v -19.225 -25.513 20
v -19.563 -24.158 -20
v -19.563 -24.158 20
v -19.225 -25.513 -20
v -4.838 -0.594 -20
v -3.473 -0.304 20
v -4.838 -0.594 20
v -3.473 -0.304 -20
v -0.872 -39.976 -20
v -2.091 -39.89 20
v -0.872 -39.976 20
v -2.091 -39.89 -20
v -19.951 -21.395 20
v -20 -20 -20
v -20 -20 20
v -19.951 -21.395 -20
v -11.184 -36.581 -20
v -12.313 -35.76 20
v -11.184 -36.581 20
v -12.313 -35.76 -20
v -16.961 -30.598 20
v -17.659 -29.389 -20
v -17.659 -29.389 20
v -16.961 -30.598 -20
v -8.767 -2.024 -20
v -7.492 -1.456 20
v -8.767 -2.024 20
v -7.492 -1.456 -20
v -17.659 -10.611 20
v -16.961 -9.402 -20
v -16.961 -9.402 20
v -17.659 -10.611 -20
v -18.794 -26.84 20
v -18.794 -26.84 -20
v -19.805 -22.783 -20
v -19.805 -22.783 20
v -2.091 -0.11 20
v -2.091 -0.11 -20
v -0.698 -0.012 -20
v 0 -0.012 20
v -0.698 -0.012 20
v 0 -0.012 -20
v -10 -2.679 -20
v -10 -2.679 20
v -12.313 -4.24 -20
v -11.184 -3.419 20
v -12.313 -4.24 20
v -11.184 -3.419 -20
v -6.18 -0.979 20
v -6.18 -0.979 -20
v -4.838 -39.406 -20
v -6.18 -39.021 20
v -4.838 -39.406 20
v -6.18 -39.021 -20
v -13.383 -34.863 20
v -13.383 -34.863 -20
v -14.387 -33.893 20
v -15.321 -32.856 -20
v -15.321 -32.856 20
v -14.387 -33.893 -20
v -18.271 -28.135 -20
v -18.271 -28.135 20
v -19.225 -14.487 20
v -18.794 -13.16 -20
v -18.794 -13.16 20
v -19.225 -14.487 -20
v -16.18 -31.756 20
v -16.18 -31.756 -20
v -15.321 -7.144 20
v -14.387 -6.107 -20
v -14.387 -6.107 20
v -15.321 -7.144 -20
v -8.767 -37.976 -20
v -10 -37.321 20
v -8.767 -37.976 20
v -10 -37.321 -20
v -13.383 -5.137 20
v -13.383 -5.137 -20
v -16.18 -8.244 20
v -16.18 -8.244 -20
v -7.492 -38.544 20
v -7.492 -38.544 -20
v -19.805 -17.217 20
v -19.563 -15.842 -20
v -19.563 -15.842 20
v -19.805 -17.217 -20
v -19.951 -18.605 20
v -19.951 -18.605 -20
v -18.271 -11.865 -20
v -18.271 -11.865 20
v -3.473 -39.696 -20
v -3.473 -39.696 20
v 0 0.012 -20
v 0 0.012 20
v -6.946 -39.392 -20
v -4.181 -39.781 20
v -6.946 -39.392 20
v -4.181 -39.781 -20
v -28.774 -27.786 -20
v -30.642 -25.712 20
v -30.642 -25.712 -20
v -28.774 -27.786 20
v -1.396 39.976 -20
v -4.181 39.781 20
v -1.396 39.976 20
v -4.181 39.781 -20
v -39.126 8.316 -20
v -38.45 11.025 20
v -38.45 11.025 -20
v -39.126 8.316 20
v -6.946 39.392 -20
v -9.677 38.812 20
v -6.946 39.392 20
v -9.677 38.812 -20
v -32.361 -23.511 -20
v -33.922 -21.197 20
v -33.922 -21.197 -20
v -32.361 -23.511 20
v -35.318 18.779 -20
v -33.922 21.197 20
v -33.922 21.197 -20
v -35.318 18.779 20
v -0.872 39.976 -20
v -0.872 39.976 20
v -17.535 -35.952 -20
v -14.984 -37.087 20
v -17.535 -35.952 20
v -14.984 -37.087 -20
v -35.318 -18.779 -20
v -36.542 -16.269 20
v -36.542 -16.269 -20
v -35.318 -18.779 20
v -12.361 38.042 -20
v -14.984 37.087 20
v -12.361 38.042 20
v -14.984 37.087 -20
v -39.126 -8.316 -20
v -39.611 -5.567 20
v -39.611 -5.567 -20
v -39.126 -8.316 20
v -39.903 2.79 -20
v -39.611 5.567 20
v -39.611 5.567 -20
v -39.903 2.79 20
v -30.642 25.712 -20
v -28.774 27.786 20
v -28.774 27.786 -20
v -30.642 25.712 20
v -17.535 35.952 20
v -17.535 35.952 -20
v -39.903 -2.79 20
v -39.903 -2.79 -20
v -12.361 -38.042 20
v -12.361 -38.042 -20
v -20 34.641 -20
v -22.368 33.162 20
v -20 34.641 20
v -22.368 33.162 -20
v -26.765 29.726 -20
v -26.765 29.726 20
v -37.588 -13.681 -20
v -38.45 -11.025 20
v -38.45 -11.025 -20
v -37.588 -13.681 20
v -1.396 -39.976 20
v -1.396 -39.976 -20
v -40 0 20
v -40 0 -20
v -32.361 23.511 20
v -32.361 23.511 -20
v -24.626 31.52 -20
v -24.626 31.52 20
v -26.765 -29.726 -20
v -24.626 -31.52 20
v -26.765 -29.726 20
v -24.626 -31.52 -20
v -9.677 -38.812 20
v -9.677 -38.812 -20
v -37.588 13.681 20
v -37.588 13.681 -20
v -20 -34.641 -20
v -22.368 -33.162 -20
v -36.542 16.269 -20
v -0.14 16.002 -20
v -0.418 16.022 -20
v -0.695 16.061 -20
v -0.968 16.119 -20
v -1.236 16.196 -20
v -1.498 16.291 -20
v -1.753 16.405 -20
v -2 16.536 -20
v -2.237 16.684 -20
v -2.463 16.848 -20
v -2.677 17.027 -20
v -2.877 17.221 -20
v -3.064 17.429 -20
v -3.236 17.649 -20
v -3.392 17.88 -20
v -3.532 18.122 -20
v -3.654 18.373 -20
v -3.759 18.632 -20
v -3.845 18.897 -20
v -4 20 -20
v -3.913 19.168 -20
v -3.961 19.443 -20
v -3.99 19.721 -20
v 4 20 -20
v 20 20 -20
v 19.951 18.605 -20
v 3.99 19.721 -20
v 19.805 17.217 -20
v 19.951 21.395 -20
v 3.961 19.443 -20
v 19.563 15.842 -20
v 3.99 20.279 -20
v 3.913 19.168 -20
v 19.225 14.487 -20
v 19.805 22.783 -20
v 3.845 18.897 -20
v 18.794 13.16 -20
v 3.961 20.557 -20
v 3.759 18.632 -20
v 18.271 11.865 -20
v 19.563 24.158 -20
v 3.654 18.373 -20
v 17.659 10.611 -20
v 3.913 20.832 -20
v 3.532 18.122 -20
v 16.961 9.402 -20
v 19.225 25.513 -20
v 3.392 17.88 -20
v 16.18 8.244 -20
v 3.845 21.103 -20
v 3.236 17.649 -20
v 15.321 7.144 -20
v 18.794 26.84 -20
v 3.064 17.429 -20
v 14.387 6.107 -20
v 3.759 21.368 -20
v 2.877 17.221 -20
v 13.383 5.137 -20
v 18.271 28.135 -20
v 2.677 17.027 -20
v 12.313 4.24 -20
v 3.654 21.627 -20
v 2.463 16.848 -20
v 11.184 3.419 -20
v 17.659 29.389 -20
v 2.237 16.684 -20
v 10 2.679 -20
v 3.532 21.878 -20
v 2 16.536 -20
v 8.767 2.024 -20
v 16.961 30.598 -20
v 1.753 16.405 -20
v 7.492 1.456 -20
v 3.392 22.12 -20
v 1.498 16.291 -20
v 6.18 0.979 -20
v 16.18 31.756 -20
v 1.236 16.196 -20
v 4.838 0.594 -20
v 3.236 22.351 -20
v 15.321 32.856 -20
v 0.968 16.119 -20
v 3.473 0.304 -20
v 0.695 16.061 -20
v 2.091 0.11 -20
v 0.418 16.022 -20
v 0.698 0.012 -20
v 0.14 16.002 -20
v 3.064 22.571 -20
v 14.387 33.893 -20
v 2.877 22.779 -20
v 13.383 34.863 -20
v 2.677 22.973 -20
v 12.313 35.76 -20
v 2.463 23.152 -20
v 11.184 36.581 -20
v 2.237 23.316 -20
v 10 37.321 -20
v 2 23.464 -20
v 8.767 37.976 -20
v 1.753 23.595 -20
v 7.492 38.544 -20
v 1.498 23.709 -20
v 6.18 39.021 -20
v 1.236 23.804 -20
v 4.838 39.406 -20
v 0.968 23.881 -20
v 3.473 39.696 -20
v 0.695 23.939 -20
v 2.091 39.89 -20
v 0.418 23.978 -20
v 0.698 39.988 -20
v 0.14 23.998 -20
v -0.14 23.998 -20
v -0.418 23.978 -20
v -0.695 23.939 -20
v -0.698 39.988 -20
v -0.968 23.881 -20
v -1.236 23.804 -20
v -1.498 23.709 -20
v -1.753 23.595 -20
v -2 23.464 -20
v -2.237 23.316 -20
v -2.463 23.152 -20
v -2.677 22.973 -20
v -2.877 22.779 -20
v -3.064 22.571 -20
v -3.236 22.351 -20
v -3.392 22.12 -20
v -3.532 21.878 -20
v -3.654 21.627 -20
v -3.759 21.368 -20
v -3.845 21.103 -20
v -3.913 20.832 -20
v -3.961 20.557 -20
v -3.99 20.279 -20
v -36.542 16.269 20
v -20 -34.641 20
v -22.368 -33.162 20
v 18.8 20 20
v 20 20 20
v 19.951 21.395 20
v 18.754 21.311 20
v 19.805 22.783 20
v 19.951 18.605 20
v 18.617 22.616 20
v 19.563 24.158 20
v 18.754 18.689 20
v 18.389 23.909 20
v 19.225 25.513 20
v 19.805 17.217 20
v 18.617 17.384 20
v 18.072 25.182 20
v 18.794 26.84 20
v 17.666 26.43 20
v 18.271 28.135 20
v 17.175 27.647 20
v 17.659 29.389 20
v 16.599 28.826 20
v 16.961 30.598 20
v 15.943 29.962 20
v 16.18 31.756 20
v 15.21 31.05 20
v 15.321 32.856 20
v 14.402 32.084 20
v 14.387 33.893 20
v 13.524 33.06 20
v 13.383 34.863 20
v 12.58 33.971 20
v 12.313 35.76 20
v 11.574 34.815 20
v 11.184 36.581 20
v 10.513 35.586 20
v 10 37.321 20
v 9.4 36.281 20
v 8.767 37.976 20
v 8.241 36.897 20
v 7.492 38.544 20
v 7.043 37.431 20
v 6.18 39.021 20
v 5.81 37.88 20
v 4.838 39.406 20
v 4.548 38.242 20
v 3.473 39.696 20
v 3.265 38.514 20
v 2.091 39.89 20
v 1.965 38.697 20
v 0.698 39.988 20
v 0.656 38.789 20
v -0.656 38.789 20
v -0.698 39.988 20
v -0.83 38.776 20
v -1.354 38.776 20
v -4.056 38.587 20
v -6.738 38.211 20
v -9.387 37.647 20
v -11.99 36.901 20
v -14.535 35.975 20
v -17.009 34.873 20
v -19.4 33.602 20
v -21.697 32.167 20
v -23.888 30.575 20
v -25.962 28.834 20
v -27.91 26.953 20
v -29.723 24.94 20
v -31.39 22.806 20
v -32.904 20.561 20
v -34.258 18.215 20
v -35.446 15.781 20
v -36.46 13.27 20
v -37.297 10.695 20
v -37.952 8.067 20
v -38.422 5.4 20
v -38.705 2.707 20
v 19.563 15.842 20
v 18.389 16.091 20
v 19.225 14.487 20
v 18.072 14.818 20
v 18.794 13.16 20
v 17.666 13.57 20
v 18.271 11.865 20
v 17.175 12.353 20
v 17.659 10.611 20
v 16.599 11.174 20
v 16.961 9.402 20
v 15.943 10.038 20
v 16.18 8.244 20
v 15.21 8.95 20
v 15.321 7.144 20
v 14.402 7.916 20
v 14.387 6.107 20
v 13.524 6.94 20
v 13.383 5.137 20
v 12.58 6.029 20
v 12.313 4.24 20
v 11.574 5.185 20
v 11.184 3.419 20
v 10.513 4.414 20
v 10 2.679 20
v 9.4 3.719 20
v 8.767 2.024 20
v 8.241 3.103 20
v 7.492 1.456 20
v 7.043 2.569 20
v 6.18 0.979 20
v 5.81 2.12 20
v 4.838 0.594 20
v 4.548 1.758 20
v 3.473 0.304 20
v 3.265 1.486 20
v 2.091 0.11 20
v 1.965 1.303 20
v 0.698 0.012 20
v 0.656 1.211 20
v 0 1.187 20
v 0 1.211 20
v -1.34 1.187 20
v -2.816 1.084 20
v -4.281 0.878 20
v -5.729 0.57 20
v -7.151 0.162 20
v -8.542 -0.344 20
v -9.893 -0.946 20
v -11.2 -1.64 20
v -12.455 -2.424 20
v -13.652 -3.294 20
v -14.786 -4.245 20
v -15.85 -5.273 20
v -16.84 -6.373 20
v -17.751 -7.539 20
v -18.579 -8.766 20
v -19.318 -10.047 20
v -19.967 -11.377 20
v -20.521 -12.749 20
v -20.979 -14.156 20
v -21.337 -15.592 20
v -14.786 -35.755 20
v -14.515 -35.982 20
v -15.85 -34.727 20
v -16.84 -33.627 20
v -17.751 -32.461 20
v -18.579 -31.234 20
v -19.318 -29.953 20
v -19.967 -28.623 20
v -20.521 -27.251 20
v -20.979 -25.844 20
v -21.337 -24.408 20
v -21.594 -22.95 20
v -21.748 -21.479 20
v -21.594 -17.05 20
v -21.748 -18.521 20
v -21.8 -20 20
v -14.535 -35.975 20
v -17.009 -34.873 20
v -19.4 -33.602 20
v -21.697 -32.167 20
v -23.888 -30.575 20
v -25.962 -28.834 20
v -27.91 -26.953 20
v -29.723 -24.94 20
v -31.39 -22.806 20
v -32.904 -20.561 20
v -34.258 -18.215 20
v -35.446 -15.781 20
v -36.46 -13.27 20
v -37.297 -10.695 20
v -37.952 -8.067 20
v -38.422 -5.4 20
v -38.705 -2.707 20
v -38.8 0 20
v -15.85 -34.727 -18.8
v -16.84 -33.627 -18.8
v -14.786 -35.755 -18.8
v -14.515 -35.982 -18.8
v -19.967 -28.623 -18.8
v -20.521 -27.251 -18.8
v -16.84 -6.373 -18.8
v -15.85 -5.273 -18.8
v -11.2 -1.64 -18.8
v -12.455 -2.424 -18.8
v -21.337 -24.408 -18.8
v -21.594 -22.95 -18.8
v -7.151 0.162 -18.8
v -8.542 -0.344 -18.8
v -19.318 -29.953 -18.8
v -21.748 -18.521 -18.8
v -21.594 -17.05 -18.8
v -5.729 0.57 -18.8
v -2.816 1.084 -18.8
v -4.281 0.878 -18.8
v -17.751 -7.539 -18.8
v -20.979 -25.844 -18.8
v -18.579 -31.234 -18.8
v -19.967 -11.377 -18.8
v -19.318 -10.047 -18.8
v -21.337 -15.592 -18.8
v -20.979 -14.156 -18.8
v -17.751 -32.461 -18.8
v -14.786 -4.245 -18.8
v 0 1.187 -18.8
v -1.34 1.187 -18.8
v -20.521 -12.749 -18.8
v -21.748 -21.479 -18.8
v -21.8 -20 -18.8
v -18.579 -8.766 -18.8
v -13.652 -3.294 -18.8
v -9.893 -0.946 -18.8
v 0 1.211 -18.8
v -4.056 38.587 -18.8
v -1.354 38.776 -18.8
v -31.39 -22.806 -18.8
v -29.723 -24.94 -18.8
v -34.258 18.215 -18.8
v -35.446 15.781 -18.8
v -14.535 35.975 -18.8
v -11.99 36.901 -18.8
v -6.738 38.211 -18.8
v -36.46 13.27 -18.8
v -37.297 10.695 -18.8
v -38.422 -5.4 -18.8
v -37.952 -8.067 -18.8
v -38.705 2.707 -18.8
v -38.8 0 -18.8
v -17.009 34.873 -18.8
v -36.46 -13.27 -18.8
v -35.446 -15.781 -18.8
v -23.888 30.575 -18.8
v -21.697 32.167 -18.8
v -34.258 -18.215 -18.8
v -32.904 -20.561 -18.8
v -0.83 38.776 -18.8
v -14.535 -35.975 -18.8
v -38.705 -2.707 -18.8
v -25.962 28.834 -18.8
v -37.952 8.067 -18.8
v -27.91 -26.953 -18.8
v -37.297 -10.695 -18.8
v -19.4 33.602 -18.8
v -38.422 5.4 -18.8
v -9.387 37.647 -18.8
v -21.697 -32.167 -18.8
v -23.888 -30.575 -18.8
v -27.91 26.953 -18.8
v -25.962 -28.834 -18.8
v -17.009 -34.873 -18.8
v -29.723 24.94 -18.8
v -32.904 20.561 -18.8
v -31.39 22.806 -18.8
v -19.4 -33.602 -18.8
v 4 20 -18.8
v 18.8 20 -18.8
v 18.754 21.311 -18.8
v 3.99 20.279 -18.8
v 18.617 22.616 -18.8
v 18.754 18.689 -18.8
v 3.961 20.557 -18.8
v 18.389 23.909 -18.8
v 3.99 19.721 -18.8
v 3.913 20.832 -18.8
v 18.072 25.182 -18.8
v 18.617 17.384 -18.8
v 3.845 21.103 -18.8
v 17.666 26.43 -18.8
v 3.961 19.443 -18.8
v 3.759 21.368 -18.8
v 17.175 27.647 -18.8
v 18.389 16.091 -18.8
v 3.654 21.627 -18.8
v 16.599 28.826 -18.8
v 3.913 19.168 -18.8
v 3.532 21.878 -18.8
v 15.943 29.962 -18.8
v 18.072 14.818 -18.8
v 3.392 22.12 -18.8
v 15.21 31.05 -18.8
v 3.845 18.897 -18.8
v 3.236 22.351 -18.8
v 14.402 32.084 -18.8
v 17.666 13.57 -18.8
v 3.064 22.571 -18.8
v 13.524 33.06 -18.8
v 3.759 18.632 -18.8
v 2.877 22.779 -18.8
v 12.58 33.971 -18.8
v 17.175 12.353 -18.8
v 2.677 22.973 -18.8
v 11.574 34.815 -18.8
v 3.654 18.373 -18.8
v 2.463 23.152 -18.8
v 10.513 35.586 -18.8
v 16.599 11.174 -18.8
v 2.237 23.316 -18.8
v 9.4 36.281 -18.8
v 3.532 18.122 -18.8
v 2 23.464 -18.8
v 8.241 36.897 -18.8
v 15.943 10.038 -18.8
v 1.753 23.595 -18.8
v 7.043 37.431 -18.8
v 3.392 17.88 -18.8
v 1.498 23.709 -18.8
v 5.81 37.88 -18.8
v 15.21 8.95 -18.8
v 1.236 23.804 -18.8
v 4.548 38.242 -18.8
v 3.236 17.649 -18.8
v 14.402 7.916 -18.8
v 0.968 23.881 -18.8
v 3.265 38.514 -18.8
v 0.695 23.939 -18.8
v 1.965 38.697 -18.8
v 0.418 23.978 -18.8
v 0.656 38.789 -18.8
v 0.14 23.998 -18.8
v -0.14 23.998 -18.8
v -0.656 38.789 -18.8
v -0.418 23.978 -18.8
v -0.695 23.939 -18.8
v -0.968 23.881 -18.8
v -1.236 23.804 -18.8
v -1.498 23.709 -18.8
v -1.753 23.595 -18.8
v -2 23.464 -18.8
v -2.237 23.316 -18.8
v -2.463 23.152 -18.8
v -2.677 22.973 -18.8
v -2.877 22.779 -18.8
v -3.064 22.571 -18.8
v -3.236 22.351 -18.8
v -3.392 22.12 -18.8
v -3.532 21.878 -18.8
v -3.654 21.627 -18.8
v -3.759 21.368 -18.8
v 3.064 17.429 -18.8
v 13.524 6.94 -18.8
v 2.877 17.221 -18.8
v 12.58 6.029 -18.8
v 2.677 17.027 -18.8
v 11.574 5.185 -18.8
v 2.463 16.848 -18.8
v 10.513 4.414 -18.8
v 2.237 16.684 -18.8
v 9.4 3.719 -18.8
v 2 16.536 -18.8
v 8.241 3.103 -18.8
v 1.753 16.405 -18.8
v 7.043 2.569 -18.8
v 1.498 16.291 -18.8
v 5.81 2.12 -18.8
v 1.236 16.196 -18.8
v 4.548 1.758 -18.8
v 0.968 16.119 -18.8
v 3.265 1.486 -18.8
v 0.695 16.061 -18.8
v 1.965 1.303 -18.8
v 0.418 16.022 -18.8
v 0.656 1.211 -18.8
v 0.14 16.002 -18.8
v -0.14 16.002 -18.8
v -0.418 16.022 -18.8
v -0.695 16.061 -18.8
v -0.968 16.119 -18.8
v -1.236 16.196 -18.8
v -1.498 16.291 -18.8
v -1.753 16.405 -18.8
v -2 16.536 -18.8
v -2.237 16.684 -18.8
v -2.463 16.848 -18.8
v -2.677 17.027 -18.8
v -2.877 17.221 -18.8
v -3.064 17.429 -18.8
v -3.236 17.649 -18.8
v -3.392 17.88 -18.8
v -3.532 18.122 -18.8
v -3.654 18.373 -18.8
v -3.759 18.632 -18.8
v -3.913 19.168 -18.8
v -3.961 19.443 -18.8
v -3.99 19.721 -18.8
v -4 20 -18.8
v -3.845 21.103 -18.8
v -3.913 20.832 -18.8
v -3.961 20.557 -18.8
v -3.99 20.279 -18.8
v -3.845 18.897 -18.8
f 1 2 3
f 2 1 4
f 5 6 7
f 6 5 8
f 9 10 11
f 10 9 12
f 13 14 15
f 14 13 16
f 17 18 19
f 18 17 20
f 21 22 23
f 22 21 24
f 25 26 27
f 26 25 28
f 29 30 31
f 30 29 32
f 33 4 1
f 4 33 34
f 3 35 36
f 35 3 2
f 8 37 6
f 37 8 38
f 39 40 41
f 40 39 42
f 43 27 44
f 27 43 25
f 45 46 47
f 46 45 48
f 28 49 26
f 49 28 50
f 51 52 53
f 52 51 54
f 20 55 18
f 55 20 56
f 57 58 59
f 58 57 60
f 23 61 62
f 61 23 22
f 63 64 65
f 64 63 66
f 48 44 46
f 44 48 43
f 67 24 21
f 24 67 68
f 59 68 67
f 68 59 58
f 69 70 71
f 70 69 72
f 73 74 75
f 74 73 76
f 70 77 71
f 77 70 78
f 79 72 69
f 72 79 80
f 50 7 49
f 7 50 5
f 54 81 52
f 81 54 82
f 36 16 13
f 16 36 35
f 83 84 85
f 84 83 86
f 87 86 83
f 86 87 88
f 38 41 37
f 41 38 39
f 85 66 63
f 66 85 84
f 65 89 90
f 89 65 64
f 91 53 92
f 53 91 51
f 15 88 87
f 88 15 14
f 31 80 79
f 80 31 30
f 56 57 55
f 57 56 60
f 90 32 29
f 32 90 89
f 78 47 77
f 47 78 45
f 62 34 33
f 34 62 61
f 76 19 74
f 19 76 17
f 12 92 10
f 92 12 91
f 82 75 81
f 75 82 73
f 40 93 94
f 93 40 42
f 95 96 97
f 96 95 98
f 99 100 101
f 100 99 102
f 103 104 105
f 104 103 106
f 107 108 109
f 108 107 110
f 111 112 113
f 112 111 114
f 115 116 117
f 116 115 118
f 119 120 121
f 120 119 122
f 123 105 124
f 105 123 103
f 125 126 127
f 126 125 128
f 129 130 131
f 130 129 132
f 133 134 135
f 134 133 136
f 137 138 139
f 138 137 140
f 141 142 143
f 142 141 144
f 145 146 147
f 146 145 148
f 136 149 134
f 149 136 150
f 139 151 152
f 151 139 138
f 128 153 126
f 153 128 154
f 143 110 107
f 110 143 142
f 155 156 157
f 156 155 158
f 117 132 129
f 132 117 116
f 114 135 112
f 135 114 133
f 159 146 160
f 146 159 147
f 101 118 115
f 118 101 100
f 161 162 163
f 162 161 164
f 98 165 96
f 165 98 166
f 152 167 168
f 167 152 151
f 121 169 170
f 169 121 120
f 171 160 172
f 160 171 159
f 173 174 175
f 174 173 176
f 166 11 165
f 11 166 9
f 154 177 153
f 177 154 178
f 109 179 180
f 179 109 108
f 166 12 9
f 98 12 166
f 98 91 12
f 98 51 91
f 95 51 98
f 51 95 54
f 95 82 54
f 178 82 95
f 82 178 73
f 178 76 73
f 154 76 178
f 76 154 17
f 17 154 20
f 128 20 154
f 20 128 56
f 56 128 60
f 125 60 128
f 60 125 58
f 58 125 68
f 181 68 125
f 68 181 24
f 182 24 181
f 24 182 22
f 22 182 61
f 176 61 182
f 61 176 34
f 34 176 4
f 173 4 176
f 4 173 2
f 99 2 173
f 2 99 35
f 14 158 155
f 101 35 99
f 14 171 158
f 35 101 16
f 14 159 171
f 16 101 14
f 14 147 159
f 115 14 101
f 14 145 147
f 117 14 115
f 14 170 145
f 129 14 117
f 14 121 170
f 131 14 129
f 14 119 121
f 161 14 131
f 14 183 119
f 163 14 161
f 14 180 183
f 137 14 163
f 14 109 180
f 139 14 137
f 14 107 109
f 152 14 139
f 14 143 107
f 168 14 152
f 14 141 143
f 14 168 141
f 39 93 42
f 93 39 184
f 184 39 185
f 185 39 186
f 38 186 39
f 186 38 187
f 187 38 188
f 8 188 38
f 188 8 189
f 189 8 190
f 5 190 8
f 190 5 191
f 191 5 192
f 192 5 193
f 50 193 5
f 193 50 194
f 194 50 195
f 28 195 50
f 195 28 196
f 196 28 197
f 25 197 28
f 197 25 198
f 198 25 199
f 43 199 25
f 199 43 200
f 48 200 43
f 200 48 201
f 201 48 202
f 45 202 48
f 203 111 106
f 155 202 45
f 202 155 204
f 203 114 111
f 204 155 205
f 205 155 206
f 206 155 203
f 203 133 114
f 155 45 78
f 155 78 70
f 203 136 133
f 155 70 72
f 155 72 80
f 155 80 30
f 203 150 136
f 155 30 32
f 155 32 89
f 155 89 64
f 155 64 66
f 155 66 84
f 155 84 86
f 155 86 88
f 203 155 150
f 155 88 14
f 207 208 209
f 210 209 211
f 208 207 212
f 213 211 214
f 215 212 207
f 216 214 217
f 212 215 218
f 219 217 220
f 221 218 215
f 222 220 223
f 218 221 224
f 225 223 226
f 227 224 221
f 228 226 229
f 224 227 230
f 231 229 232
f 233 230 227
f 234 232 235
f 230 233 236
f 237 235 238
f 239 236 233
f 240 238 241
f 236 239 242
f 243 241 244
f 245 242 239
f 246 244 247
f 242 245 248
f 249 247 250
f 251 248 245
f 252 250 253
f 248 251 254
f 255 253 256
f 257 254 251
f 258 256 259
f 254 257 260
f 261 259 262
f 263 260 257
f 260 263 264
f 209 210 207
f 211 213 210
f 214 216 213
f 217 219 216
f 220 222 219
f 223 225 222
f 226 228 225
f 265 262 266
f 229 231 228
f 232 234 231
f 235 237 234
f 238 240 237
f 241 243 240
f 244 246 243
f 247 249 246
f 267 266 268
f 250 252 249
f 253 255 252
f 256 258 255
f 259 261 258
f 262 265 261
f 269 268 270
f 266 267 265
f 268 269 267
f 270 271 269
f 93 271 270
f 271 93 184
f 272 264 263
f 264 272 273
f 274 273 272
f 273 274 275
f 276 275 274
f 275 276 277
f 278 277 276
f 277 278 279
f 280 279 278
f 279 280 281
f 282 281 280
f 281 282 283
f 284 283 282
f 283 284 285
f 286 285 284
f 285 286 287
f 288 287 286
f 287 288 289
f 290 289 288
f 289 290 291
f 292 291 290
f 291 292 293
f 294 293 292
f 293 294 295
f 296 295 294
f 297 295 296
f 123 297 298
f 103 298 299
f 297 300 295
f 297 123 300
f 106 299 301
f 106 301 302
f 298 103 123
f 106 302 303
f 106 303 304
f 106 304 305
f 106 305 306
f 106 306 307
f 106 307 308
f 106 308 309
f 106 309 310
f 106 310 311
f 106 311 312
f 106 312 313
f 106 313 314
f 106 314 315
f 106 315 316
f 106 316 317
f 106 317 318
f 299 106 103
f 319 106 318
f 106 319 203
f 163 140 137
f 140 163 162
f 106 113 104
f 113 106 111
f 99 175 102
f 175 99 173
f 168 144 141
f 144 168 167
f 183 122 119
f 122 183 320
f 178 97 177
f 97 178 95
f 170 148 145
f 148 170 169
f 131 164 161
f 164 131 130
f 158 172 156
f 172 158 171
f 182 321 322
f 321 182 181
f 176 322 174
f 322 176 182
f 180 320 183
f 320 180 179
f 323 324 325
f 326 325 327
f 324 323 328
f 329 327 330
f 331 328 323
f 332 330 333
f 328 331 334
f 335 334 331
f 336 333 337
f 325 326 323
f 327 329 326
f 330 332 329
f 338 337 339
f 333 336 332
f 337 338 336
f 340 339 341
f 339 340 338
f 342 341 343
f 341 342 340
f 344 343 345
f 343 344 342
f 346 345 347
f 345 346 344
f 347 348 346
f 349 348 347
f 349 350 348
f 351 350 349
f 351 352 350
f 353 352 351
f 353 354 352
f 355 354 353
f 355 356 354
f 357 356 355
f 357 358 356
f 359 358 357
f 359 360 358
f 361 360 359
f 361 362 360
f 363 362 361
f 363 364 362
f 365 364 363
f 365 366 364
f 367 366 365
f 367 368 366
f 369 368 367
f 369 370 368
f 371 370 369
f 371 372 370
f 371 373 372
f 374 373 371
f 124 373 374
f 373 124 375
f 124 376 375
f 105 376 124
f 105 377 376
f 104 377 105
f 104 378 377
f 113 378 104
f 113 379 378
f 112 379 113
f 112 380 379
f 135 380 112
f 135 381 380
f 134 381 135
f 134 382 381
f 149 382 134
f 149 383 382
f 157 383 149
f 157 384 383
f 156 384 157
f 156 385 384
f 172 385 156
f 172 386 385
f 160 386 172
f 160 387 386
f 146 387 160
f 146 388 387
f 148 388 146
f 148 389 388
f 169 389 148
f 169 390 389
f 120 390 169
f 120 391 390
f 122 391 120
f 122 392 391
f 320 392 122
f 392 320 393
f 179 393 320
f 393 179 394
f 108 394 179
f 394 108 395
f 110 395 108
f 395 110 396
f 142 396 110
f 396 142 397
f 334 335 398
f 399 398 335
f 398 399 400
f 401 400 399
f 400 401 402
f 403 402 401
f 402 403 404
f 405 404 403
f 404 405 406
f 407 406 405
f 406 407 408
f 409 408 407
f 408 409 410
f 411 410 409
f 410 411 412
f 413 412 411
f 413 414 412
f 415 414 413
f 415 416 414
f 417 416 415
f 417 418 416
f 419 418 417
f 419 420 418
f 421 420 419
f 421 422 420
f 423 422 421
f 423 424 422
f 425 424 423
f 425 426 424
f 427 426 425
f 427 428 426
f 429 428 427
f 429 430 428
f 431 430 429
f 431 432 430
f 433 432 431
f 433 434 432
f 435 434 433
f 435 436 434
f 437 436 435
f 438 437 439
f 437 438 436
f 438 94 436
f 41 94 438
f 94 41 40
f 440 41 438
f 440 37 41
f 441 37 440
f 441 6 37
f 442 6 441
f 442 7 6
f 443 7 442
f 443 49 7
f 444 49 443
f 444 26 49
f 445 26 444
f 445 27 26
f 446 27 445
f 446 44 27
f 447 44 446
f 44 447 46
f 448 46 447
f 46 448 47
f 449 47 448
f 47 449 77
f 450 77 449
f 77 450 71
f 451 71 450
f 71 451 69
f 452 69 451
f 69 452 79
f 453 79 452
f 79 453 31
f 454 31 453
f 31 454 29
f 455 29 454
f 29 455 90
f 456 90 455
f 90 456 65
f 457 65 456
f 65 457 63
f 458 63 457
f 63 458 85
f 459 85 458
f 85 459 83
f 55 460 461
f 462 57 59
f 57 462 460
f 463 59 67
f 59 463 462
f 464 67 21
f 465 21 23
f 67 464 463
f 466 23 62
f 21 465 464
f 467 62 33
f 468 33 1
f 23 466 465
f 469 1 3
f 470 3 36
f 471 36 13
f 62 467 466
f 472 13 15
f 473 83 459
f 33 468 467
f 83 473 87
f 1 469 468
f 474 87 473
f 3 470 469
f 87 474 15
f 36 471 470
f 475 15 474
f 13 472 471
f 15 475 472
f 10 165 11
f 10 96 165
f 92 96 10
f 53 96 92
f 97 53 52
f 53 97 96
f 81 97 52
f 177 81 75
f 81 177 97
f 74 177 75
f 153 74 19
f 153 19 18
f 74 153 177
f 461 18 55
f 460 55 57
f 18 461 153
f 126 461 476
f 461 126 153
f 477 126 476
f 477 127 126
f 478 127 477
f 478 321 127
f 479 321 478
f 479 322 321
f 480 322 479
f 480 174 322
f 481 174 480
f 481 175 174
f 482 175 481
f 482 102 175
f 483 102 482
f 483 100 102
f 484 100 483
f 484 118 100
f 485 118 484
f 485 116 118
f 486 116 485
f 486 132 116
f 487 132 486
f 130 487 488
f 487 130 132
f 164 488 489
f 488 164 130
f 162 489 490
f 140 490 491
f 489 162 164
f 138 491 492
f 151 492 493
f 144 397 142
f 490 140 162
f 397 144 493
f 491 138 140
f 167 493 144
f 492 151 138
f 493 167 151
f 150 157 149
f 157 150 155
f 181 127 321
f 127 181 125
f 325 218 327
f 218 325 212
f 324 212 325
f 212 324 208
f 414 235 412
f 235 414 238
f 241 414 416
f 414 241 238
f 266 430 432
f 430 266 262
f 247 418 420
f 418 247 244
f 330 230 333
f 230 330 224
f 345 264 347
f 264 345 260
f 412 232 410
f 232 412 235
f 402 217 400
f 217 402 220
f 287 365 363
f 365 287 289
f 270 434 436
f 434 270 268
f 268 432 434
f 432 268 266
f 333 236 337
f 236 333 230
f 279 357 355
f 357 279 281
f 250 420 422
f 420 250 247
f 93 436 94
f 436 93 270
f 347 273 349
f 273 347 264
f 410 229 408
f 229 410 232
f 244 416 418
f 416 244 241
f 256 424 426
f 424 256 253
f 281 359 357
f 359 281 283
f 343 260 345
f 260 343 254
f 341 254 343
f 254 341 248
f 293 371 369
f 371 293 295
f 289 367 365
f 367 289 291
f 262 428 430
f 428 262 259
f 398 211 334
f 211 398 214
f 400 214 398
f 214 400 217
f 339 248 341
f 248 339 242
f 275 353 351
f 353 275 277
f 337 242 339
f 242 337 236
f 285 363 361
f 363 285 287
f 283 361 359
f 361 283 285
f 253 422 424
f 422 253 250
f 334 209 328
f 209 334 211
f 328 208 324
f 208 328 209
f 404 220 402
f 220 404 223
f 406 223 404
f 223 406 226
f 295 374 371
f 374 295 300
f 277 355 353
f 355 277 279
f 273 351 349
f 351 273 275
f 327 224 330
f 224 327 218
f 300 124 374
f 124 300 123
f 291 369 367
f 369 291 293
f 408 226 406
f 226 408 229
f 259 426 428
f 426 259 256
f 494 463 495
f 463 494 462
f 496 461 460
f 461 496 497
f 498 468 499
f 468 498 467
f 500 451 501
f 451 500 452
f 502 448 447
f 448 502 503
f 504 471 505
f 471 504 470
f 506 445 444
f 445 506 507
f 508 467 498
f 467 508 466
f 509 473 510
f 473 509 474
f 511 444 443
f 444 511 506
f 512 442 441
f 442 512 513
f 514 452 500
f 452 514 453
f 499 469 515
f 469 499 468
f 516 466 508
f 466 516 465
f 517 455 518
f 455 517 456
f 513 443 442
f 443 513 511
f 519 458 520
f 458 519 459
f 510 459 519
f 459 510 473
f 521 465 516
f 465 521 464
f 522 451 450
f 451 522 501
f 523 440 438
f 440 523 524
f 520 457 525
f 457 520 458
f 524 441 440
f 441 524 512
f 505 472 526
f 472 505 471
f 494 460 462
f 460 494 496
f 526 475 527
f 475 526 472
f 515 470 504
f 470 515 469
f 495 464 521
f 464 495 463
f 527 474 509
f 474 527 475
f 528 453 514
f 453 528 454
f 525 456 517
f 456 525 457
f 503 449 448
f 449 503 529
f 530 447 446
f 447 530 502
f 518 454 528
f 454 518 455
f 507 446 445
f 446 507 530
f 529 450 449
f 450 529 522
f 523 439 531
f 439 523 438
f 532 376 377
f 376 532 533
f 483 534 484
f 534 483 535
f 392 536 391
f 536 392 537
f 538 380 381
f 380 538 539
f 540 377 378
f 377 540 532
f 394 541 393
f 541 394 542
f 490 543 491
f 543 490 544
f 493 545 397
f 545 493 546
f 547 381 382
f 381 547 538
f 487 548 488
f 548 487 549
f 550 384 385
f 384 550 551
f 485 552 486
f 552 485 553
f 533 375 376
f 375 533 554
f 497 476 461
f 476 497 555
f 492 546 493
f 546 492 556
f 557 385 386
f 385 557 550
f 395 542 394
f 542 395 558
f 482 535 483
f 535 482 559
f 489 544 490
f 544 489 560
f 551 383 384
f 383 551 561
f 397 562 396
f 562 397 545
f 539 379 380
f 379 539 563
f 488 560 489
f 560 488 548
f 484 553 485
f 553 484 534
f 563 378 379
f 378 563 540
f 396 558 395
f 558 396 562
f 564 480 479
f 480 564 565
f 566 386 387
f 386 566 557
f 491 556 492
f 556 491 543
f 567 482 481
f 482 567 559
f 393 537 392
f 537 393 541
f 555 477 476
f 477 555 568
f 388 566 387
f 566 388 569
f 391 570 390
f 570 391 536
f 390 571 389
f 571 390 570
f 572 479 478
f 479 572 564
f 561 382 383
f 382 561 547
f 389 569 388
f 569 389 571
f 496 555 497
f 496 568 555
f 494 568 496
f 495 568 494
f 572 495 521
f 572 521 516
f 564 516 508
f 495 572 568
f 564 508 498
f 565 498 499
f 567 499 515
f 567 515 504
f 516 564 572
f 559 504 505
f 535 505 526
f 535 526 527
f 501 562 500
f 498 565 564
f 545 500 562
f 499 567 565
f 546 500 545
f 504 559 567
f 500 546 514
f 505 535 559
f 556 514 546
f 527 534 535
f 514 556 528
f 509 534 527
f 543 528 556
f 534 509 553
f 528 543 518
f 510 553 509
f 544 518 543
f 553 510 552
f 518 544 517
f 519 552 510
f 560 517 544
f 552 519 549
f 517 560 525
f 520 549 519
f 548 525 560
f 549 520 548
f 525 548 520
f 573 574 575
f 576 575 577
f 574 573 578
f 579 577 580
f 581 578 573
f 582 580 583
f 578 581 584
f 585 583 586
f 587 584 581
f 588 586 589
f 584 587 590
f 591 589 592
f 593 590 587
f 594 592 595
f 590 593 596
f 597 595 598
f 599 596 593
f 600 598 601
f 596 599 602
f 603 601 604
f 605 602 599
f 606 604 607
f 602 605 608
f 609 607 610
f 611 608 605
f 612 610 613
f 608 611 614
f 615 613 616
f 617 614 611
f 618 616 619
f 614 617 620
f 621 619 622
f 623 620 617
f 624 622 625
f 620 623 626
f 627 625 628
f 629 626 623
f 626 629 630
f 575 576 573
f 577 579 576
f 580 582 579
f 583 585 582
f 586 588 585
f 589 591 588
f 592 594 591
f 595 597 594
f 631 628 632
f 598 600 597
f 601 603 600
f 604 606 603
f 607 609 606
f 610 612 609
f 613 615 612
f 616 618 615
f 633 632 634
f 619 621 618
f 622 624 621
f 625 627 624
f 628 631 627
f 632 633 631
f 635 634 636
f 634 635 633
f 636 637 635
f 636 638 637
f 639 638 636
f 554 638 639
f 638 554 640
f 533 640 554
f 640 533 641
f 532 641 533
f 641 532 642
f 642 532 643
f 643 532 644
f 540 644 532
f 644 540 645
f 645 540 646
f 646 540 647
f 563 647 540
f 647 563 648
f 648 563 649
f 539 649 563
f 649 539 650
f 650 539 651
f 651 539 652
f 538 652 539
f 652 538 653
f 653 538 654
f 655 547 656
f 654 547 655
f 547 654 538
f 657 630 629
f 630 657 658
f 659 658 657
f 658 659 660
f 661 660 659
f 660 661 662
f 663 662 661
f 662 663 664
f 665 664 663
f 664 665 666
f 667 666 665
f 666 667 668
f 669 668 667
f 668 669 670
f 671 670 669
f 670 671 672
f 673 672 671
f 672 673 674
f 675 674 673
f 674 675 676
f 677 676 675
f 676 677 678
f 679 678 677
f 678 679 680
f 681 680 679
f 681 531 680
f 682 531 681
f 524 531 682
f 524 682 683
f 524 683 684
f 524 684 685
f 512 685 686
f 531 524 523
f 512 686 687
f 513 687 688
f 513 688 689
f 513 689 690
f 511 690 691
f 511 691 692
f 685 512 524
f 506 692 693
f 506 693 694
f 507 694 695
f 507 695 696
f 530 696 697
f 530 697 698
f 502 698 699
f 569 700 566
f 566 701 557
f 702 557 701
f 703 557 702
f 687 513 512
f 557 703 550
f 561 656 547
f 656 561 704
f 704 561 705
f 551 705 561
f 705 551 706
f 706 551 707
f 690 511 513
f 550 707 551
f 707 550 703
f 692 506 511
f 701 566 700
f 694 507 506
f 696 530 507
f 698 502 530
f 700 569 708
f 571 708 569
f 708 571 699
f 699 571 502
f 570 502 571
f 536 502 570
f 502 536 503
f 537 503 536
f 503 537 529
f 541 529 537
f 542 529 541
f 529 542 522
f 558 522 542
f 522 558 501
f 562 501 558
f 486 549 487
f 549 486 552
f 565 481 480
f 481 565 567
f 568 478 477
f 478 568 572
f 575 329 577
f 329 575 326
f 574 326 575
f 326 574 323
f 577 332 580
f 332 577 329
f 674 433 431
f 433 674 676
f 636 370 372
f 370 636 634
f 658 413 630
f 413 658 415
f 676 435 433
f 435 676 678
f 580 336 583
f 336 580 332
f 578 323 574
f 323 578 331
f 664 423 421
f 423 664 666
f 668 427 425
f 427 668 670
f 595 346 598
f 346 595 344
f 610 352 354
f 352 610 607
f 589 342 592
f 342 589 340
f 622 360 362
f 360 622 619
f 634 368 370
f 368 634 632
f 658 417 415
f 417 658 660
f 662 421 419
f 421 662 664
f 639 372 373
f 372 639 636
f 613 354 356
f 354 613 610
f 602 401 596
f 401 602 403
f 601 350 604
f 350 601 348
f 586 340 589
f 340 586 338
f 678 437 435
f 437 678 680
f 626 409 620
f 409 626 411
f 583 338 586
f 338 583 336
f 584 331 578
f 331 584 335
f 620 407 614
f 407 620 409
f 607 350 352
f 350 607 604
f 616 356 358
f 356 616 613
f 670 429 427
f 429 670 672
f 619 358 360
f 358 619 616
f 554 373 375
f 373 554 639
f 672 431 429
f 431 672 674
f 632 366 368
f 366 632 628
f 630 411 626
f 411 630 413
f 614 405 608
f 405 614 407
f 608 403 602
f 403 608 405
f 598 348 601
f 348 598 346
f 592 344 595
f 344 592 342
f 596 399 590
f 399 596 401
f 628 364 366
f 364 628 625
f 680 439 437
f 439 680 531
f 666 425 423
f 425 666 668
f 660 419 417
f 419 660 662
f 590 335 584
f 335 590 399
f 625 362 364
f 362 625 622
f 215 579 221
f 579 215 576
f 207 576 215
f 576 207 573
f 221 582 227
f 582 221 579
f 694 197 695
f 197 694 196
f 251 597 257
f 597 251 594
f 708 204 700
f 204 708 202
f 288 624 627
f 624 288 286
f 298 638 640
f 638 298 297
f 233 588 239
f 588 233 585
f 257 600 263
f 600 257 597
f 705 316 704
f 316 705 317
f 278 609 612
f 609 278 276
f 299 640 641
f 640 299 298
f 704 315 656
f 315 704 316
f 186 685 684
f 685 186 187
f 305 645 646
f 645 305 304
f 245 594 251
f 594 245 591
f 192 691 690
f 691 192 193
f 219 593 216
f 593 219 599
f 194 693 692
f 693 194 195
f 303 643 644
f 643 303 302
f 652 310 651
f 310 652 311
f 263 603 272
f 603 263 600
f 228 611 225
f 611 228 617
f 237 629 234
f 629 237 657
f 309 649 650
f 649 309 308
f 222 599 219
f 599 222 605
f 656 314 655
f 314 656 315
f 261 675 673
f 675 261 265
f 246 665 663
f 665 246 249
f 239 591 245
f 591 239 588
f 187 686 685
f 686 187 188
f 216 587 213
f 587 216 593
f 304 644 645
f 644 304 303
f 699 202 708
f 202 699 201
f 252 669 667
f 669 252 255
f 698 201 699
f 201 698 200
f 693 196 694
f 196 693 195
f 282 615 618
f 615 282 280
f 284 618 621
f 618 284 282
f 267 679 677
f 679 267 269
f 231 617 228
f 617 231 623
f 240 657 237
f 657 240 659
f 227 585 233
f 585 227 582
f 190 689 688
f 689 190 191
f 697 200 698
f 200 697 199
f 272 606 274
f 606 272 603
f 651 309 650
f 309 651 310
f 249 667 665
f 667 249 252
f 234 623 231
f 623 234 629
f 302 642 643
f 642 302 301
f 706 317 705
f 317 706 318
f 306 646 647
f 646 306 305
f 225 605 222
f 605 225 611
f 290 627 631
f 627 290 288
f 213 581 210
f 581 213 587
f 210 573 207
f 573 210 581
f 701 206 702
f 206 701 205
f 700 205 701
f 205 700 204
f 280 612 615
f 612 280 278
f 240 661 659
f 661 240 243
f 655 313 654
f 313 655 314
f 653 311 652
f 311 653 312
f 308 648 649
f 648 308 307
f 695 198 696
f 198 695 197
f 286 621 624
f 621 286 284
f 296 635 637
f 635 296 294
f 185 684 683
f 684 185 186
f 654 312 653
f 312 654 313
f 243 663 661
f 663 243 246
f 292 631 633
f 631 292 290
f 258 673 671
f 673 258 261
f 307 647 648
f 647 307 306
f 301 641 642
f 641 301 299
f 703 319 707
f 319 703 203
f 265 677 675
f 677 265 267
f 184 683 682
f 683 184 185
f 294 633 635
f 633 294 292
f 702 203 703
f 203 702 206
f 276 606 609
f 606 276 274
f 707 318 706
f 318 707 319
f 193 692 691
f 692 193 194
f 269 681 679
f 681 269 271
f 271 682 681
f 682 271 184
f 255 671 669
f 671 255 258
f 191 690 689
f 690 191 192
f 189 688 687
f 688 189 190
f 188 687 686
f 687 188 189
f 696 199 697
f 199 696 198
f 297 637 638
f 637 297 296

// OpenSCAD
// lucina
// 2017-09-08

// preview[view:south, tilt:top]
/* [yin-yang dimensions] */
// outer circle diameter in mm
outerD = 80;   //[50:5:200]
// height in mm
height = 40;      //[20:5:200]
// wall thicknessin mm
wall = 1.2;  //[.9:.1:6]
// bottom drain hole
drainHole = "yes"; //[yes, no]
// bottom drain hole diameter in mm
drainHoleD = 8; //[5:1:15]
// select planter, saucer, or frame
selection = "planter"; //[planter, saucer, frame]
// saucer or frame height in mm
saucerHeight = 7; //[5:1:20]
// saucer or frame wall thickness in mm
saucerWall = .9; //[.9:.1:6]

/* [Hidden] */
$fn = 90;
x = 0; y = 1; z = 2;
outerR = outerD/2;
innerR = outerR-wall;
module yin(w) {
   union() {
      difference() {
         cylinder(h = height, r = outerR, center = true);
         union() {
            translate([0, -(outerR/2), 0])
               cylinder(h = height*2, r = outerR/2, center=true);
            translate([outerR/2, 0, 0])
               cube([outerR, 2*outerR, 2*height], center=true);
         }
      }
      translate([0, outerR/2, 0])
         cylinder(h = height, r = outerR/2, center=true);
   }
}
module yang(w) {
      union() {
         difference() {
            cylinder(h = height, r = innerR, center = true);
            union() {
               translate([-w/2, -outerR/2, 0])
                  cylinder(h = height*2, r = outerR/2+w, center=true);
               translate([innerR/2, 0, 0])
                  cube([innerR, 2*innerR, 2*height], center=true);
            }
         }           
         translate([0, innerR/2+w/2, 0])
            cylinder(h = height, r = innerR/2-w/2, center=true);
         if ( drainHole == "yes" )
            translate([0, outerR/2, 0])
               cylinder(h = height*2, d=drainHoleD, center=true);
      }
}
module yinYang() {
   difference() {
      yin(wall);
      translate([0, 0, wall])
         yang(wall);
   }
}

module saucer(hh, dd, tt) {
   allow = 2.5;
   taper = 5;
   union() {
      difference() {
         hull() {
            translate([0, 0, hh-.001])
               cylinder(h=.001, d=dd+2*tt+allow+taper);
            cylinder(h=.001, d=dd+2*tt+allow);
         }
         union() {
            translate([0, 0, tt])
               hull() {
                  translate([0, 0, hh-.001])
                     cylinder(h=.001, d=dd+allow+taper);
                  cylinder(h=.001, d=dd+allow);
               }
            if ( selection == "frame" ) {
               translate([0, 0, -tt])
                  cylinder(h=3*tt, d=.9*dd);
            }
         }
      }
      if ( selection == "frame" )
         interHexGrid(dd*.90, 12, tt);
   }
}
sin60 = sin(60);
cos60 = cos(60);
module hex(hole, wall, thick){
   difference(){
      rotate([0, 0, 30])
         cylinder(d = (hole + wall), h = thick, $fn = 6);
      translate([0, 0, -0.1])
         rotate([0, 0, 30])
            cylinder(d = hole, h = thick + 0.2, $fn = 6);
    }
}
// first arg is vector that defines the bounding box, length, width, height
// second arg in the 'diameter' of the holes. In OpenScad, this refers to the corner-to-corner diameter, not flat-to-flat
// this diameter is 2/sqrt(3) times larger than flat to flat
// third arg is wall thickness.  This also is measured that the corners, not the flats. 
module hexgrid(box, holediameter, wallthickness) {
    a = (holediameter + (wallthickness/2))*sin60;
   for(x = [holediameter/2: a: box[x]]) {
      for(y = [holediameter/2: 2*a*sin60: box[y]]) {
         translate([x, y, 0])
            hex(holediameter, wallthickness, box[z]);
         translate([x + a*cos60, y + a*sin60, 0])
            hex(holediameter, wallthickness, box[z]);
      }
   }
}
module interHexGrid(gridDiam, hexDiam, zz) {
   intersection() {
      translate([-gridDiam/2, -gridDiam/2, 0])
         hexgrid([gridDiam, gridDiam, zz], hexDiam, zz);
      cylinder(h=zz, d=gridDiam+2*zz);
   }
}

if ( selection == "planter" ) {
   yinYang();
//   translate([wall, 0, 0])
//      rotate([0, 0, 180])
//         yinYang();
}
if ( selection == "saucer" ) {
   saucer(saucerHeight, outerD, wall/2);
}
if (selection == "frame" ) {
      saucer(saucerHeight, outerD, wall/2);
}
